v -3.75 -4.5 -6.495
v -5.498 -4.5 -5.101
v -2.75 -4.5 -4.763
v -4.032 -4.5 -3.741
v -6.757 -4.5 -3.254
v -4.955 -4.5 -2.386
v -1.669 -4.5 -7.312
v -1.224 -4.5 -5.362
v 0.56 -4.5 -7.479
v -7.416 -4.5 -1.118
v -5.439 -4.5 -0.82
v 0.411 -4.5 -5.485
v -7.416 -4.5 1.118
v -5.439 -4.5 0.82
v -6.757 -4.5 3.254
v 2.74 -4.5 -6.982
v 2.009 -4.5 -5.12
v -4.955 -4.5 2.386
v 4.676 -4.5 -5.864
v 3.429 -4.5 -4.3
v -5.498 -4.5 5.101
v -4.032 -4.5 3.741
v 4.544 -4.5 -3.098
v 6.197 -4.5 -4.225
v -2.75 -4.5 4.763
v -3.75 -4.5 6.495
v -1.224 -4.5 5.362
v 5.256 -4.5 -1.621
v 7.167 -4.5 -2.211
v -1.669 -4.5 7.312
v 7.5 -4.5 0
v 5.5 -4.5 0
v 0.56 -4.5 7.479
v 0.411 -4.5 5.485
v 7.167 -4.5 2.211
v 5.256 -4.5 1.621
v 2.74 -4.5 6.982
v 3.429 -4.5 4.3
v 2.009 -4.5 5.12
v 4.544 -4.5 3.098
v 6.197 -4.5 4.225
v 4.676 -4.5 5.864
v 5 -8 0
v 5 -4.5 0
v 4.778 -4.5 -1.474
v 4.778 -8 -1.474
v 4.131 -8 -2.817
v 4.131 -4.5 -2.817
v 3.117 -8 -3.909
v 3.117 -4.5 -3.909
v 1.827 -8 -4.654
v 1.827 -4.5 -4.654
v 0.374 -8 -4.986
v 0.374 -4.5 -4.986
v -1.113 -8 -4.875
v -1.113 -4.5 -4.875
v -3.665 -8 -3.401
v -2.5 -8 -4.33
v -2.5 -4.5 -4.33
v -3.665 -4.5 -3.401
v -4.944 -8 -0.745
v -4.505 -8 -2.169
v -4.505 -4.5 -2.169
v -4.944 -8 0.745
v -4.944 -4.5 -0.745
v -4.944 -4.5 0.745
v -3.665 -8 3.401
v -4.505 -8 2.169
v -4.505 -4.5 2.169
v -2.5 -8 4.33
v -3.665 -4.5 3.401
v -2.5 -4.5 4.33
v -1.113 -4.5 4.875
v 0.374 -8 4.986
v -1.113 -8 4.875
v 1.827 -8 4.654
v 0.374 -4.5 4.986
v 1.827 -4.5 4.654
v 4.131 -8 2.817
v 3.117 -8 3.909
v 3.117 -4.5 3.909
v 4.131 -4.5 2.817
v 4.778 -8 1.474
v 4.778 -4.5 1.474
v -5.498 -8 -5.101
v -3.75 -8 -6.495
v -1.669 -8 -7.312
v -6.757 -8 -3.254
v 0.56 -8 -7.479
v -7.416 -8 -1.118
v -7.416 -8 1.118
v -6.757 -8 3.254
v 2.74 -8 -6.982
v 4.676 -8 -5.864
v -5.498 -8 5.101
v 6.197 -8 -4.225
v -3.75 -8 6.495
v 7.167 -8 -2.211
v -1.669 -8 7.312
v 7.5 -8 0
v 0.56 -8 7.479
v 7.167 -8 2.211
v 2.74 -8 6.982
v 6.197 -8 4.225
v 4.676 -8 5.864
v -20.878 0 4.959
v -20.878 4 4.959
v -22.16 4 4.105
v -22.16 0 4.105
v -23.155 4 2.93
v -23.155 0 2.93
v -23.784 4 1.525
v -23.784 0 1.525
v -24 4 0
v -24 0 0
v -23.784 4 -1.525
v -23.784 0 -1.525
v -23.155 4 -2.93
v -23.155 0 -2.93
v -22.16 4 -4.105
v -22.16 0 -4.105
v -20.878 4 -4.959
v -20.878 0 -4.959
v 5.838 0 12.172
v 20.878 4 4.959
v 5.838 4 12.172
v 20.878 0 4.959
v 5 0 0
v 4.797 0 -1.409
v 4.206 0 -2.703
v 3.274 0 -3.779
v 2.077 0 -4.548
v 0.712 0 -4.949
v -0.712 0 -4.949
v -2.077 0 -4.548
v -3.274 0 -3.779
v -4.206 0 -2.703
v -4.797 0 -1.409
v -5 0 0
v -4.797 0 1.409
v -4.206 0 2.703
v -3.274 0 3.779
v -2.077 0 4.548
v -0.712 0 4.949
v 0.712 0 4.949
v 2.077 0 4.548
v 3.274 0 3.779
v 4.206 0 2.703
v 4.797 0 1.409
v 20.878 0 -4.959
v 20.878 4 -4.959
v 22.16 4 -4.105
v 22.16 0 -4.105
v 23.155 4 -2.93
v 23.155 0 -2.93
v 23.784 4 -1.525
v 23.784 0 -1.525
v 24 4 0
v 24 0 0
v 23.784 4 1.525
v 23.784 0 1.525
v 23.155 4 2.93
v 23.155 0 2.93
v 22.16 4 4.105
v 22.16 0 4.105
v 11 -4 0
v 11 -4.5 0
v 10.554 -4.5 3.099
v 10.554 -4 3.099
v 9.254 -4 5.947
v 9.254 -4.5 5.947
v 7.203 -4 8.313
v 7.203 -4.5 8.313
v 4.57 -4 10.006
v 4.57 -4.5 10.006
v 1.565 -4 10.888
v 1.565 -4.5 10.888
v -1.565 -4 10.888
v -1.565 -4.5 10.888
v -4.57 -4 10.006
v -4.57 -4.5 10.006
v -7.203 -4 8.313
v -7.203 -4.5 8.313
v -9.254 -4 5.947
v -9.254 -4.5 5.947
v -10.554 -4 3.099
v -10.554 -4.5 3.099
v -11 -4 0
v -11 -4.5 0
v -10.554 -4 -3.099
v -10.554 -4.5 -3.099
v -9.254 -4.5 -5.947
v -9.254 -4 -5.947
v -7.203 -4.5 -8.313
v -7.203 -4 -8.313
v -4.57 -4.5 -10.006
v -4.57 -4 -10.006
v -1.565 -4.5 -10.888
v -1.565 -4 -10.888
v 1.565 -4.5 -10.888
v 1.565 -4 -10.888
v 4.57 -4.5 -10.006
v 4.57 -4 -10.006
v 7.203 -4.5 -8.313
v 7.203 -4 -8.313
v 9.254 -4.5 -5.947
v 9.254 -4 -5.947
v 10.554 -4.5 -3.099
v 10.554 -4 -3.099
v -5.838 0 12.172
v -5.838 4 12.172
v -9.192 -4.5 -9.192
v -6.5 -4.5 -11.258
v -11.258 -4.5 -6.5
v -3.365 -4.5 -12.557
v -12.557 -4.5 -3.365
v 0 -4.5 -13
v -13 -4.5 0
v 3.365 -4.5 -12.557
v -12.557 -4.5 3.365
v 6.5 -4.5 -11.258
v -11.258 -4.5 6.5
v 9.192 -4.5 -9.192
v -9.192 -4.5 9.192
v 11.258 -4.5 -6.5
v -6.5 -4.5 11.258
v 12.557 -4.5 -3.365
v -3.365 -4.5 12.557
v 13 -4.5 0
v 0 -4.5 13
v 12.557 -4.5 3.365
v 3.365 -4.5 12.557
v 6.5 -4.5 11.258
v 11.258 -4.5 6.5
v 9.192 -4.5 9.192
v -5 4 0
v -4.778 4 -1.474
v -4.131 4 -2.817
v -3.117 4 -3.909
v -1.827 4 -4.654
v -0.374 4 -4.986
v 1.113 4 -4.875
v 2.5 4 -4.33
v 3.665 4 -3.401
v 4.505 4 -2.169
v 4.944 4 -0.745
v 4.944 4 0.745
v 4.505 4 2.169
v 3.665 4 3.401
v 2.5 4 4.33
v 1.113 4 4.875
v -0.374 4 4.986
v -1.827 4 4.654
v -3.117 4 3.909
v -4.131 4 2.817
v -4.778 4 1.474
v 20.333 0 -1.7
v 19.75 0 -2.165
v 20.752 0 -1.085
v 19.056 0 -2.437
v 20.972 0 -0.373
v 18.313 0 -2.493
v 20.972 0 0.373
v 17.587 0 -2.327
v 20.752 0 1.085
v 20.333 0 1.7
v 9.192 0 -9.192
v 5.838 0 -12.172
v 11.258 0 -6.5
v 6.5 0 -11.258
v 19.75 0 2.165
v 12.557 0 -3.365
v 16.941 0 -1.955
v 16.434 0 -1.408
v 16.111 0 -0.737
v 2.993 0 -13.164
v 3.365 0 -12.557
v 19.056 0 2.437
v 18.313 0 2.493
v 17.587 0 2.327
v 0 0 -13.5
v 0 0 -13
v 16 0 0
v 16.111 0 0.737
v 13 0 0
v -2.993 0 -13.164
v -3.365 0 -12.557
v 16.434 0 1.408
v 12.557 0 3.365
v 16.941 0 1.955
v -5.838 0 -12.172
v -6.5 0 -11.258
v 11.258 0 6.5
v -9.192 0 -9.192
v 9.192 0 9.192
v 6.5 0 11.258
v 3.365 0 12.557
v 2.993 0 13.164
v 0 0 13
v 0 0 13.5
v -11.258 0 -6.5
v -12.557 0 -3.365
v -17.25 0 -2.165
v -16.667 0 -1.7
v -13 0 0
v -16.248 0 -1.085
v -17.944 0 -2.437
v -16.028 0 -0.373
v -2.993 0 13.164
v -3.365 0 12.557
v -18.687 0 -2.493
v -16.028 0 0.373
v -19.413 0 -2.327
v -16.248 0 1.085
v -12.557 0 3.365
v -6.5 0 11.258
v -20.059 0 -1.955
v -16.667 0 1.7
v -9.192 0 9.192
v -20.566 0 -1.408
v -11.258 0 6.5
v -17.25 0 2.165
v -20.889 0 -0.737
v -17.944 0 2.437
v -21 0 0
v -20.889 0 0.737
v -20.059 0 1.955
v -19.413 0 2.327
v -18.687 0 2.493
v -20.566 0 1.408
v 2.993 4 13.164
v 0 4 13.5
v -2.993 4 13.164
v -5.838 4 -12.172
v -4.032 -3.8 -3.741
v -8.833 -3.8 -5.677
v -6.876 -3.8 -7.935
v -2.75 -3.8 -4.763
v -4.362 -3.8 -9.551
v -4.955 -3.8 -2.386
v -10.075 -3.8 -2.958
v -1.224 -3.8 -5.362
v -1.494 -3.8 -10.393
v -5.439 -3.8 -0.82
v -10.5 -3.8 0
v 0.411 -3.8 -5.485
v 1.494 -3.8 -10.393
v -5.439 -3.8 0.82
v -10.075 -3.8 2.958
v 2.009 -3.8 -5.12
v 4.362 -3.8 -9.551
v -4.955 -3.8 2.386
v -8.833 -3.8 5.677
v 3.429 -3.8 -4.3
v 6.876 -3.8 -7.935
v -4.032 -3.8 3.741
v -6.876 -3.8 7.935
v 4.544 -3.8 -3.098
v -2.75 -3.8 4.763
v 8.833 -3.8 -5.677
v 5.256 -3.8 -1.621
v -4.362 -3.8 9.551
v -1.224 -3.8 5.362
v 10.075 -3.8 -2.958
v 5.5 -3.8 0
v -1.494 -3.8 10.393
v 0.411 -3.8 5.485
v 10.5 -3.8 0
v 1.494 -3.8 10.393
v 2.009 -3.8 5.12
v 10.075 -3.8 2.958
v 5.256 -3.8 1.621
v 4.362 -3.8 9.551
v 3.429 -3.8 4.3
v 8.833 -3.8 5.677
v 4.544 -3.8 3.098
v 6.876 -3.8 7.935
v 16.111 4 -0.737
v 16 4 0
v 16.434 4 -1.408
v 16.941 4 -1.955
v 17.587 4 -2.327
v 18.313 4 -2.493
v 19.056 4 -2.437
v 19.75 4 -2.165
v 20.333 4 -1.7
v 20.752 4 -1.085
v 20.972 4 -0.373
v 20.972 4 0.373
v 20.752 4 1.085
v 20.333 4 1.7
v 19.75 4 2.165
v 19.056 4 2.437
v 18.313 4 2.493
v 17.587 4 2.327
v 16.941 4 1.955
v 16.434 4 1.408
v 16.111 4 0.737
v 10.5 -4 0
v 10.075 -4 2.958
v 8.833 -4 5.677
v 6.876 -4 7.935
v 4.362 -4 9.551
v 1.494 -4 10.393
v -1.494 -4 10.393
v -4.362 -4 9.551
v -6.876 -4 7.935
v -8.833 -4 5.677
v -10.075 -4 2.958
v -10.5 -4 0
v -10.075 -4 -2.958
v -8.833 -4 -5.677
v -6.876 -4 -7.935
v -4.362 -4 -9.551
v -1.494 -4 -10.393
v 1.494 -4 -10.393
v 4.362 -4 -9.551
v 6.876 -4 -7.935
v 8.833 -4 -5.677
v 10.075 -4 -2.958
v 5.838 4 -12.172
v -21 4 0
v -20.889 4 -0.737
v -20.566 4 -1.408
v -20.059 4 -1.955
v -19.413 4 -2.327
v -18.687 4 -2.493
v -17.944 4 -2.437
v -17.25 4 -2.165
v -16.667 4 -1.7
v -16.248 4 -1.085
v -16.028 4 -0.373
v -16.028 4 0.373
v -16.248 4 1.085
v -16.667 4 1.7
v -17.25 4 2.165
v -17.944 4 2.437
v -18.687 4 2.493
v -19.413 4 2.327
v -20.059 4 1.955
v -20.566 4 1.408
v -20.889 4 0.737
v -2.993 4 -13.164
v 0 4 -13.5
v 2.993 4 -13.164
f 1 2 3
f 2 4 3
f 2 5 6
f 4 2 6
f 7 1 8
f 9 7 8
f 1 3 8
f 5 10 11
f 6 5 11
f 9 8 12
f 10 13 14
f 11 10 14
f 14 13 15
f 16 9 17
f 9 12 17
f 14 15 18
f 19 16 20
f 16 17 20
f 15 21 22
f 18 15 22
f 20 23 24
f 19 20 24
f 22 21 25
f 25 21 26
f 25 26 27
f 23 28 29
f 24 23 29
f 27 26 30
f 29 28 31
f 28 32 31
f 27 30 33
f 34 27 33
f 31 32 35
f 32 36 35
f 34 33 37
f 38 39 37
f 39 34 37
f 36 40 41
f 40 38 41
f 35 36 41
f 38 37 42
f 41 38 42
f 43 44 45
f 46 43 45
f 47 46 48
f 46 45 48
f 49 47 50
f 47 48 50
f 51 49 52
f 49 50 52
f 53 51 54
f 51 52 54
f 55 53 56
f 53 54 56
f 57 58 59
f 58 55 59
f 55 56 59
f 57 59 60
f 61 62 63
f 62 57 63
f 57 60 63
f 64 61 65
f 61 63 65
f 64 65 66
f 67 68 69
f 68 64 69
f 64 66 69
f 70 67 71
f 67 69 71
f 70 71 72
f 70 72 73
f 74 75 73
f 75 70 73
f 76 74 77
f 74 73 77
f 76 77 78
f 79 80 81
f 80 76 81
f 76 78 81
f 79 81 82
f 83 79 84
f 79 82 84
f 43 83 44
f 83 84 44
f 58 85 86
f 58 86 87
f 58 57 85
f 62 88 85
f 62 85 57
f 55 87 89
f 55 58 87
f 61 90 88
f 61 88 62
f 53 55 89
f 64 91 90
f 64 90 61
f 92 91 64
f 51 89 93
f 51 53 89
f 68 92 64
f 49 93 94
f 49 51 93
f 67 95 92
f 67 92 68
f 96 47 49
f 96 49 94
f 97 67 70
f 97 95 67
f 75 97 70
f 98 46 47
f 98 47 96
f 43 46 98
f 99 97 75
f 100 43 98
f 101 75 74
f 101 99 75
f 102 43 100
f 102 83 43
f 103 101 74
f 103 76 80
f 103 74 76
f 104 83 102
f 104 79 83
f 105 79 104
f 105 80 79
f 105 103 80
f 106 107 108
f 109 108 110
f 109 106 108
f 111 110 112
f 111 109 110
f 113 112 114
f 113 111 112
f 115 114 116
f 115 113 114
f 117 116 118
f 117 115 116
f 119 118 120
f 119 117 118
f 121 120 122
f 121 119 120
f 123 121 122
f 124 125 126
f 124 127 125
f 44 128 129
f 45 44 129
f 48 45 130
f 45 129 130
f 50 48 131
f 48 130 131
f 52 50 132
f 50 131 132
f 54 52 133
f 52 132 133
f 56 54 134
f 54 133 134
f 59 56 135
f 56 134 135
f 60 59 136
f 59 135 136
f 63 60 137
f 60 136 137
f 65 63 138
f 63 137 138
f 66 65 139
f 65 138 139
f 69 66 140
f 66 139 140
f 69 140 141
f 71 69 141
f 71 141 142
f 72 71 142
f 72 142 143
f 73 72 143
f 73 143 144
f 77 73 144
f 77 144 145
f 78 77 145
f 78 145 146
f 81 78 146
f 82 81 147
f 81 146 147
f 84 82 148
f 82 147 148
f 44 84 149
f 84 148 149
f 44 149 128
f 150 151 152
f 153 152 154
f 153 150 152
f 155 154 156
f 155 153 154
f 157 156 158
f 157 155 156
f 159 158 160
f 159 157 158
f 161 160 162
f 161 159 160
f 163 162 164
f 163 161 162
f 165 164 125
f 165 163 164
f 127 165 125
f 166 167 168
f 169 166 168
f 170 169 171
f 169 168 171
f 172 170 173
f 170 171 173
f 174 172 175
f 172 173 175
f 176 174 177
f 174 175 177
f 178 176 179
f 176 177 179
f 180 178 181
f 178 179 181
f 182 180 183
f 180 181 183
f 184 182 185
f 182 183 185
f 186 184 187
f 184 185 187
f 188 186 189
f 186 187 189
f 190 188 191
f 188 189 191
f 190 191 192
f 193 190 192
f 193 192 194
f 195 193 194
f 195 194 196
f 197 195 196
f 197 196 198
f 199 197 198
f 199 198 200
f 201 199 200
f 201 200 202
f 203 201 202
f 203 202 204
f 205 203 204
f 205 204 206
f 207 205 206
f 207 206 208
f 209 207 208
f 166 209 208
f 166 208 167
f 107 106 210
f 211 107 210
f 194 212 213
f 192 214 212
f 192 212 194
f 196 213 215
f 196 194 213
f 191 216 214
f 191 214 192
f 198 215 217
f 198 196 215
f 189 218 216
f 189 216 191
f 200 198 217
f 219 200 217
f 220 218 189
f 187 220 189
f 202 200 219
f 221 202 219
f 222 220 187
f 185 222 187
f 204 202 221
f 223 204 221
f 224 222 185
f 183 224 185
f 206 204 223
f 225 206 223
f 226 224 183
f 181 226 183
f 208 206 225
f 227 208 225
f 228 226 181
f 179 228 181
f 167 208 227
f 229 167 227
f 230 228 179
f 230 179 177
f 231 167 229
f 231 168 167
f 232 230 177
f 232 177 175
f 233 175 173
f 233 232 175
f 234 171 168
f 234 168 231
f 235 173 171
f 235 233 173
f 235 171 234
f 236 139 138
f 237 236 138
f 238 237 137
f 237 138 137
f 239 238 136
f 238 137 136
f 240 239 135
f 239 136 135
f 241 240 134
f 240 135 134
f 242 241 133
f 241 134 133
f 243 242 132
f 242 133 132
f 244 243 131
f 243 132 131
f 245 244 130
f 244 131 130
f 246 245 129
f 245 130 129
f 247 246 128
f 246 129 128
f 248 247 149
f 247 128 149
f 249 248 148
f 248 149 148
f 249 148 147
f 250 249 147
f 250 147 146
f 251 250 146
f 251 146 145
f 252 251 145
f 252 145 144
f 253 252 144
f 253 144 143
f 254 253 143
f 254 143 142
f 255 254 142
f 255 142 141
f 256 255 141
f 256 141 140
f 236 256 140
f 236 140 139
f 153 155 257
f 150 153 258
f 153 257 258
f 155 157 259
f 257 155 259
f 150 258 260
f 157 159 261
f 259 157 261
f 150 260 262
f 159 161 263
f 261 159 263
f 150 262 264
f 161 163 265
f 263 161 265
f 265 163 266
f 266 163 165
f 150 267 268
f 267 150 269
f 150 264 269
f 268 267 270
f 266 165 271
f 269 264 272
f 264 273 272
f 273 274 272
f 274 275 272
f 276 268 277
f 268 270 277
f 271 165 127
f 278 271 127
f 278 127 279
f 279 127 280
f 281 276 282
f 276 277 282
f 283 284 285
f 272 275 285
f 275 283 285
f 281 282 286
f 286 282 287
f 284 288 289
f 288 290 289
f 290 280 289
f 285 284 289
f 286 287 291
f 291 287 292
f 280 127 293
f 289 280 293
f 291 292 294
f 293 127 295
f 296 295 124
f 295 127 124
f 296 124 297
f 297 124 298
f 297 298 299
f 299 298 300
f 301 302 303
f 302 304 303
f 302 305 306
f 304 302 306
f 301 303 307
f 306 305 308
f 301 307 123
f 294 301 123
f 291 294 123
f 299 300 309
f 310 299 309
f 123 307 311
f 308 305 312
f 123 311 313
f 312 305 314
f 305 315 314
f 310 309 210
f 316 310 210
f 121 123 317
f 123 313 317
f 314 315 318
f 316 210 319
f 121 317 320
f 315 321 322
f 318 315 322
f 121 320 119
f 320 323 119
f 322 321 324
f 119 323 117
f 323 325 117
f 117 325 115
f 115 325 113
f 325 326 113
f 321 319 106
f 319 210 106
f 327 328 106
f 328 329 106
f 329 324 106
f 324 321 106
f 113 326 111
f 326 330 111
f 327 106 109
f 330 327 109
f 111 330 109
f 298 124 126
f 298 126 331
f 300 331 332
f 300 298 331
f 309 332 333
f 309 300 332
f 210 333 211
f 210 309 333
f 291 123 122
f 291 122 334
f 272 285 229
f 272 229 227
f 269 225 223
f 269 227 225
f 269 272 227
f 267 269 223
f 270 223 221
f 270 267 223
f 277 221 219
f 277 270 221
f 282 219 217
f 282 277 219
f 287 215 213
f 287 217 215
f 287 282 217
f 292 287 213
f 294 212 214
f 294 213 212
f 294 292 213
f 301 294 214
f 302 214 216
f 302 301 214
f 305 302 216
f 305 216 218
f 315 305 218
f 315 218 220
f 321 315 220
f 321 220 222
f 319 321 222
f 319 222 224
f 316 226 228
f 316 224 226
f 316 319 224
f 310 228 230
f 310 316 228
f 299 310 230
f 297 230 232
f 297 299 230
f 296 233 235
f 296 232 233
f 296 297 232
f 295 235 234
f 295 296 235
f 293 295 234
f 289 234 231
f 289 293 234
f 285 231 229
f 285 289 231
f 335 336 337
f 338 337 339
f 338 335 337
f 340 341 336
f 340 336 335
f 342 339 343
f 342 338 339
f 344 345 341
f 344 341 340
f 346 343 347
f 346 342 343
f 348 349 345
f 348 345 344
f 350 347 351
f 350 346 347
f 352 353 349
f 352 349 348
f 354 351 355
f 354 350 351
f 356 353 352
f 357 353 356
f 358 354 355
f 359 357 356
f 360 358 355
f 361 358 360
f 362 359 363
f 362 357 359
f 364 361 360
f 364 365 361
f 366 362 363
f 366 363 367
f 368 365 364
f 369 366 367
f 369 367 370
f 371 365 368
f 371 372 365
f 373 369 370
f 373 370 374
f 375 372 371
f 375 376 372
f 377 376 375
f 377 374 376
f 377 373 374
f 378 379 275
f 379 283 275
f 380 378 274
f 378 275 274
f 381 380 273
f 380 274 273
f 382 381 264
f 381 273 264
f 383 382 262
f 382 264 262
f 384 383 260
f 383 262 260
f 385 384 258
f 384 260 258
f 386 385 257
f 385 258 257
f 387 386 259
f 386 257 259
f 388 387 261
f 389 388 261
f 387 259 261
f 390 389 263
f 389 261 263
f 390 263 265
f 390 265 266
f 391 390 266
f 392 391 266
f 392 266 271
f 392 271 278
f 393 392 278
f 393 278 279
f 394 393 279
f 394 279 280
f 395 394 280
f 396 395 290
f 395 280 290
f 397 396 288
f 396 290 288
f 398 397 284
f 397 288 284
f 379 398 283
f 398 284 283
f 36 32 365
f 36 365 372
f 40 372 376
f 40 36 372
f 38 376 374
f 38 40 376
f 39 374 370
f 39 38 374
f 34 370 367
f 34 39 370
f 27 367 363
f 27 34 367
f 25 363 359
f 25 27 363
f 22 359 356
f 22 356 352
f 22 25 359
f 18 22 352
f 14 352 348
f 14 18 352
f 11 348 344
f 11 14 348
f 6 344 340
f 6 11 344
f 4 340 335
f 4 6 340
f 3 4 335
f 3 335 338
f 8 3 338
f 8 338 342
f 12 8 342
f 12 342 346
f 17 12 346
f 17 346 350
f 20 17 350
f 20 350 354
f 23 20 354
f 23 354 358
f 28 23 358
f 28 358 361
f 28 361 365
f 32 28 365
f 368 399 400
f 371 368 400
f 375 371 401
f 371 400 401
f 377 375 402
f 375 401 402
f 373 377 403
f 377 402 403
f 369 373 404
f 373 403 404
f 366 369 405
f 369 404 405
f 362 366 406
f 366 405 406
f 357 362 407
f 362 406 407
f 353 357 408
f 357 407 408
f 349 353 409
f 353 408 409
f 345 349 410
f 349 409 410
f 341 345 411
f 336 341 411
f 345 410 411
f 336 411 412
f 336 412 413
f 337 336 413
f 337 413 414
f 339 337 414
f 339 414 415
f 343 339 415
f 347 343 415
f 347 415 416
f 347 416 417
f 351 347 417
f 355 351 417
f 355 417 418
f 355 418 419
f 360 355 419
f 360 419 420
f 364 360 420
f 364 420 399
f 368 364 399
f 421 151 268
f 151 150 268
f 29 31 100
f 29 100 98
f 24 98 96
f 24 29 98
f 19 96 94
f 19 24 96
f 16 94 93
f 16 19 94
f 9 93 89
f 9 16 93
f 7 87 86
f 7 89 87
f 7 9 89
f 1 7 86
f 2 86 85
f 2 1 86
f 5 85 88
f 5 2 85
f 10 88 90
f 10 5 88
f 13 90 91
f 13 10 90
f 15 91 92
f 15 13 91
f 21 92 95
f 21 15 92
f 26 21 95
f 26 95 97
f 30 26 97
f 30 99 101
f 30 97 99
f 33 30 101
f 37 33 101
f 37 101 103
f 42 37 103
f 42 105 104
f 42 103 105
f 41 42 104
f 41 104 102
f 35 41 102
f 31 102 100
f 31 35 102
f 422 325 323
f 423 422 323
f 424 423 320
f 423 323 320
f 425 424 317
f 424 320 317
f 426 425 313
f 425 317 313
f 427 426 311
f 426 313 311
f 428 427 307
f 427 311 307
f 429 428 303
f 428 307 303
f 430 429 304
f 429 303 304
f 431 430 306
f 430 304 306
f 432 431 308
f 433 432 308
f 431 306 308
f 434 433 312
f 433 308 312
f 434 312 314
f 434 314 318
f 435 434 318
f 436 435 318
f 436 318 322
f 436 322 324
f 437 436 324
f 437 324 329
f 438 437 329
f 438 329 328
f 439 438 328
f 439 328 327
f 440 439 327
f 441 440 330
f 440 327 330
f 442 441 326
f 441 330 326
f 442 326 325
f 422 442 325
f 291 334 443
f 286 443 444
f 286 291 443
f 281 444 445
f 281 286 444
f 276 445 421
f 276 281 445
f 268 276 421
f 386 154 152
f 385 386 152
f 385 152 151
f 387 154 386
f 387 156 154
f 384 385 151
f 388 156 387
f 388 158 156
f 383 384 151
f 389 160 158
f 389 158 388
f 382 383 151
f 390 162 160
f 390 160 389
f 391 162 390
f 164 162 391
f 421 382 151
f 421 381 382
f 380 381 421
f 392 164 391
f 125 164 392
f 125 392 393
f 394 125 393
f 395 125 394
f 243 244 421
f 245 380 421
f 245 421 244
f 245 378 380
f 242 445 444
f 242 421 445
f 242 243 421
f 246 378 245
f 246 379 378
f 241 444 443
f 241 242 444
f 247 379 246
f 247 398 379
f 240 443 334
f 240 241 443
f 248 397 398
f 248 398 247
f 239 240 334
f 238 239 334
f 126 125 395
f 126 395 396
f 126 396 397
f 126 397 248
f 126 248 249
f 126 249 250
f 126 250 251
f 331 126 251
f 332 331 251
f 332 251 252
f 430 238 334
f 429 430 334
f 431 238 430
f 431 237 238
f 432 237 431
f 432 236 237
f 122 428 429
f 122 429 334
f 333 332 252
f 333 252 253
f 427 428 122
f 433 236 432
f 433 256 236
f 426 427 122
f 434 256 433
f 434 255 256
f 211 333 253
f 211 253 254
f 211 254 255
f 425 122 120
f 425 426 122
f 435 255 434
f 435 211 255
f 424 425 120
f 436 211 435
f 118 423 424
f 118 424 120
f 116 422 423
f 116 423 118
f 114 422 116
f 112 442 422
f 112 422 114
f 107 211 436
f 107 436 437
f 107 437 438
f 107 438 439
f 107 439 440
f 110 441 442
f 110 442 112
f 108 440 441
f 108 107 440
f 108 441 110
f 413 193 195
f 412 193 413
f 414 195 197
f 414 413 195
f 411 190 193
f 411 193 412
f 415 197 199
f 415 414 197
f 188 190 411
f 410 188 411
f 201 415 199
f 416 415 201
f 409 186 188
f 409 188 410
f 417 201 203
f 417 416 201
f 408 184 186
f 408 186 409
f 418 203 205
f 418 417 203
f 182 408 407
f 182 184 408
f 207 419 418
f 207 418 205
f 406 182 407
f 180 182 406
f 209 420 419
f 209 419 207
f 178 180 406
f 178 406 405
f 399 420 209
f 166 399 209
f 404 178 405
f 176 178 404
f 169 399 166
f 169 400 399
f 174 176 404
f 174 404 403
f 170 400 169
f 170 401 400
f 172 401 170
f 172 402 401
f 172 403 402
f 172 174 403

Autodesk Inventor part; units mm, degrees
ref_plane "YZ Plane" through (0, 0, 0) normal (1, 0, 0) x (0, 1, 0)
ref_plane "XZ Plane" through (0, 0, 0) normal (0, 1, 0) x (-1, 0, 0)
ref_plane "XY Plane" through (0, 0, 0) normal (0, 0, 1) x (1, 0, 0)
sketch "Sketch1" plane through (0, 0, 0) normal (0, 1, 0) x (-1, 0, 0)
  circle A0 centre (0, 0) radius 5
  arc A1 (-5.8378, -12.1725) -> (-5.8378, 12.1725) centre (0, 0) ccw
  circle A2 centre (18.5, 0) radius 2.5
  circle A3 centre (-18.5, 0) radius 2.5
  line L0 (0, -18.9) -> (0, 18.9) projected
  line L1 (20.8784, 4.9592) -> (5.8378, 12.1725)
  line L2 (33.6, 0) -> (-33.6, 0) projected
  line L3 (20.8784, -4.9592) -> (5.8378, -12.1725)
  line L4 (-20.8784, 4.9592) -> (-5.8378, 12.1725)
  line L5 (-20.8784, -4.9592) -> (-5.8378, -12.1725)
  arc A4 (-20.8784, 4.9592) -> (-20.8784, -4.9592) centre (-18.5, 0) ccw
  arc A5 (20.8784, -4.9592) -> (20.8784, 4.9592) centre (18.5, 0) ccw
  dimension "d0" = 10
  dimension "d1" = 27
  dimension "d2" = 5
  dimension "d3" = 5
  dimension "d4" = 37
  dimension "d5" = 18.5
extrude "Extrusion1" add sketch "Sketch1" along normal blind 4 contours L2 A1 L0 A0 | A0 L0 A1 L2 | A0 L2 A3 A4 L4 A1 L0 | L0 A1 L5 A4 L2 A3 A0 | L2 A2 A5 L3 A1 | A1 L1 A5 L2 A2
sketch "Sketch2" plane through (0, 0, 0) normal (0, -1, 0) x (1, 0, 0)
  circle A0 centre (0, 0) radius 5
  circle A1 centre (0, 0) radius 13
  dimension "d11" = 26
  dimension "d23" = 10
extrude "Extrusion2" add sketch "Sketch2" along normal blind 4.5
sketch "Sketch3" plane through (0, -4.5, 0) normal (0, -1, 0) x (1, 0, 0)
  circle A0 centre (0, 0) radius 5
  circle A1 centre (0, 0) radius 5 projected
  circle A2 centre (0, 0) radius 7.5
  dimension "d14" = 15
  dimension "d24" = 10
extrude "Extrusion3" add sketch "Sketch3" along normal blind 3.5
sketch "Sketch4" plane through (0, -4.5, 0) normal (0, -1, 0) x (1, 0, 0)
  circle A0 centre (0, 0) radius 5.5
  circle A1 centre (0, 0) radius 7.5 projected
  circle A2 centre (0, 0) radius 11
  dimension "d17" = 22
extrude "Extrusion4" cut sketch "Sketch4" against normal blind 0.5 contours A1 | A2
sketch "Sketch5" plane through (0, -4, 0) normal (0, -1, 0) x (1, 0, 0)
  circle A0 centre (0, 0) radius 5.5
  circle A1 centre (0, 0) radius 10.5
  dimension "d20" = 21
extrude "Extrusion5" cut sketch "Sketch5" against normal blind 0.2
properties part number "Kep Truc KLF-08"
